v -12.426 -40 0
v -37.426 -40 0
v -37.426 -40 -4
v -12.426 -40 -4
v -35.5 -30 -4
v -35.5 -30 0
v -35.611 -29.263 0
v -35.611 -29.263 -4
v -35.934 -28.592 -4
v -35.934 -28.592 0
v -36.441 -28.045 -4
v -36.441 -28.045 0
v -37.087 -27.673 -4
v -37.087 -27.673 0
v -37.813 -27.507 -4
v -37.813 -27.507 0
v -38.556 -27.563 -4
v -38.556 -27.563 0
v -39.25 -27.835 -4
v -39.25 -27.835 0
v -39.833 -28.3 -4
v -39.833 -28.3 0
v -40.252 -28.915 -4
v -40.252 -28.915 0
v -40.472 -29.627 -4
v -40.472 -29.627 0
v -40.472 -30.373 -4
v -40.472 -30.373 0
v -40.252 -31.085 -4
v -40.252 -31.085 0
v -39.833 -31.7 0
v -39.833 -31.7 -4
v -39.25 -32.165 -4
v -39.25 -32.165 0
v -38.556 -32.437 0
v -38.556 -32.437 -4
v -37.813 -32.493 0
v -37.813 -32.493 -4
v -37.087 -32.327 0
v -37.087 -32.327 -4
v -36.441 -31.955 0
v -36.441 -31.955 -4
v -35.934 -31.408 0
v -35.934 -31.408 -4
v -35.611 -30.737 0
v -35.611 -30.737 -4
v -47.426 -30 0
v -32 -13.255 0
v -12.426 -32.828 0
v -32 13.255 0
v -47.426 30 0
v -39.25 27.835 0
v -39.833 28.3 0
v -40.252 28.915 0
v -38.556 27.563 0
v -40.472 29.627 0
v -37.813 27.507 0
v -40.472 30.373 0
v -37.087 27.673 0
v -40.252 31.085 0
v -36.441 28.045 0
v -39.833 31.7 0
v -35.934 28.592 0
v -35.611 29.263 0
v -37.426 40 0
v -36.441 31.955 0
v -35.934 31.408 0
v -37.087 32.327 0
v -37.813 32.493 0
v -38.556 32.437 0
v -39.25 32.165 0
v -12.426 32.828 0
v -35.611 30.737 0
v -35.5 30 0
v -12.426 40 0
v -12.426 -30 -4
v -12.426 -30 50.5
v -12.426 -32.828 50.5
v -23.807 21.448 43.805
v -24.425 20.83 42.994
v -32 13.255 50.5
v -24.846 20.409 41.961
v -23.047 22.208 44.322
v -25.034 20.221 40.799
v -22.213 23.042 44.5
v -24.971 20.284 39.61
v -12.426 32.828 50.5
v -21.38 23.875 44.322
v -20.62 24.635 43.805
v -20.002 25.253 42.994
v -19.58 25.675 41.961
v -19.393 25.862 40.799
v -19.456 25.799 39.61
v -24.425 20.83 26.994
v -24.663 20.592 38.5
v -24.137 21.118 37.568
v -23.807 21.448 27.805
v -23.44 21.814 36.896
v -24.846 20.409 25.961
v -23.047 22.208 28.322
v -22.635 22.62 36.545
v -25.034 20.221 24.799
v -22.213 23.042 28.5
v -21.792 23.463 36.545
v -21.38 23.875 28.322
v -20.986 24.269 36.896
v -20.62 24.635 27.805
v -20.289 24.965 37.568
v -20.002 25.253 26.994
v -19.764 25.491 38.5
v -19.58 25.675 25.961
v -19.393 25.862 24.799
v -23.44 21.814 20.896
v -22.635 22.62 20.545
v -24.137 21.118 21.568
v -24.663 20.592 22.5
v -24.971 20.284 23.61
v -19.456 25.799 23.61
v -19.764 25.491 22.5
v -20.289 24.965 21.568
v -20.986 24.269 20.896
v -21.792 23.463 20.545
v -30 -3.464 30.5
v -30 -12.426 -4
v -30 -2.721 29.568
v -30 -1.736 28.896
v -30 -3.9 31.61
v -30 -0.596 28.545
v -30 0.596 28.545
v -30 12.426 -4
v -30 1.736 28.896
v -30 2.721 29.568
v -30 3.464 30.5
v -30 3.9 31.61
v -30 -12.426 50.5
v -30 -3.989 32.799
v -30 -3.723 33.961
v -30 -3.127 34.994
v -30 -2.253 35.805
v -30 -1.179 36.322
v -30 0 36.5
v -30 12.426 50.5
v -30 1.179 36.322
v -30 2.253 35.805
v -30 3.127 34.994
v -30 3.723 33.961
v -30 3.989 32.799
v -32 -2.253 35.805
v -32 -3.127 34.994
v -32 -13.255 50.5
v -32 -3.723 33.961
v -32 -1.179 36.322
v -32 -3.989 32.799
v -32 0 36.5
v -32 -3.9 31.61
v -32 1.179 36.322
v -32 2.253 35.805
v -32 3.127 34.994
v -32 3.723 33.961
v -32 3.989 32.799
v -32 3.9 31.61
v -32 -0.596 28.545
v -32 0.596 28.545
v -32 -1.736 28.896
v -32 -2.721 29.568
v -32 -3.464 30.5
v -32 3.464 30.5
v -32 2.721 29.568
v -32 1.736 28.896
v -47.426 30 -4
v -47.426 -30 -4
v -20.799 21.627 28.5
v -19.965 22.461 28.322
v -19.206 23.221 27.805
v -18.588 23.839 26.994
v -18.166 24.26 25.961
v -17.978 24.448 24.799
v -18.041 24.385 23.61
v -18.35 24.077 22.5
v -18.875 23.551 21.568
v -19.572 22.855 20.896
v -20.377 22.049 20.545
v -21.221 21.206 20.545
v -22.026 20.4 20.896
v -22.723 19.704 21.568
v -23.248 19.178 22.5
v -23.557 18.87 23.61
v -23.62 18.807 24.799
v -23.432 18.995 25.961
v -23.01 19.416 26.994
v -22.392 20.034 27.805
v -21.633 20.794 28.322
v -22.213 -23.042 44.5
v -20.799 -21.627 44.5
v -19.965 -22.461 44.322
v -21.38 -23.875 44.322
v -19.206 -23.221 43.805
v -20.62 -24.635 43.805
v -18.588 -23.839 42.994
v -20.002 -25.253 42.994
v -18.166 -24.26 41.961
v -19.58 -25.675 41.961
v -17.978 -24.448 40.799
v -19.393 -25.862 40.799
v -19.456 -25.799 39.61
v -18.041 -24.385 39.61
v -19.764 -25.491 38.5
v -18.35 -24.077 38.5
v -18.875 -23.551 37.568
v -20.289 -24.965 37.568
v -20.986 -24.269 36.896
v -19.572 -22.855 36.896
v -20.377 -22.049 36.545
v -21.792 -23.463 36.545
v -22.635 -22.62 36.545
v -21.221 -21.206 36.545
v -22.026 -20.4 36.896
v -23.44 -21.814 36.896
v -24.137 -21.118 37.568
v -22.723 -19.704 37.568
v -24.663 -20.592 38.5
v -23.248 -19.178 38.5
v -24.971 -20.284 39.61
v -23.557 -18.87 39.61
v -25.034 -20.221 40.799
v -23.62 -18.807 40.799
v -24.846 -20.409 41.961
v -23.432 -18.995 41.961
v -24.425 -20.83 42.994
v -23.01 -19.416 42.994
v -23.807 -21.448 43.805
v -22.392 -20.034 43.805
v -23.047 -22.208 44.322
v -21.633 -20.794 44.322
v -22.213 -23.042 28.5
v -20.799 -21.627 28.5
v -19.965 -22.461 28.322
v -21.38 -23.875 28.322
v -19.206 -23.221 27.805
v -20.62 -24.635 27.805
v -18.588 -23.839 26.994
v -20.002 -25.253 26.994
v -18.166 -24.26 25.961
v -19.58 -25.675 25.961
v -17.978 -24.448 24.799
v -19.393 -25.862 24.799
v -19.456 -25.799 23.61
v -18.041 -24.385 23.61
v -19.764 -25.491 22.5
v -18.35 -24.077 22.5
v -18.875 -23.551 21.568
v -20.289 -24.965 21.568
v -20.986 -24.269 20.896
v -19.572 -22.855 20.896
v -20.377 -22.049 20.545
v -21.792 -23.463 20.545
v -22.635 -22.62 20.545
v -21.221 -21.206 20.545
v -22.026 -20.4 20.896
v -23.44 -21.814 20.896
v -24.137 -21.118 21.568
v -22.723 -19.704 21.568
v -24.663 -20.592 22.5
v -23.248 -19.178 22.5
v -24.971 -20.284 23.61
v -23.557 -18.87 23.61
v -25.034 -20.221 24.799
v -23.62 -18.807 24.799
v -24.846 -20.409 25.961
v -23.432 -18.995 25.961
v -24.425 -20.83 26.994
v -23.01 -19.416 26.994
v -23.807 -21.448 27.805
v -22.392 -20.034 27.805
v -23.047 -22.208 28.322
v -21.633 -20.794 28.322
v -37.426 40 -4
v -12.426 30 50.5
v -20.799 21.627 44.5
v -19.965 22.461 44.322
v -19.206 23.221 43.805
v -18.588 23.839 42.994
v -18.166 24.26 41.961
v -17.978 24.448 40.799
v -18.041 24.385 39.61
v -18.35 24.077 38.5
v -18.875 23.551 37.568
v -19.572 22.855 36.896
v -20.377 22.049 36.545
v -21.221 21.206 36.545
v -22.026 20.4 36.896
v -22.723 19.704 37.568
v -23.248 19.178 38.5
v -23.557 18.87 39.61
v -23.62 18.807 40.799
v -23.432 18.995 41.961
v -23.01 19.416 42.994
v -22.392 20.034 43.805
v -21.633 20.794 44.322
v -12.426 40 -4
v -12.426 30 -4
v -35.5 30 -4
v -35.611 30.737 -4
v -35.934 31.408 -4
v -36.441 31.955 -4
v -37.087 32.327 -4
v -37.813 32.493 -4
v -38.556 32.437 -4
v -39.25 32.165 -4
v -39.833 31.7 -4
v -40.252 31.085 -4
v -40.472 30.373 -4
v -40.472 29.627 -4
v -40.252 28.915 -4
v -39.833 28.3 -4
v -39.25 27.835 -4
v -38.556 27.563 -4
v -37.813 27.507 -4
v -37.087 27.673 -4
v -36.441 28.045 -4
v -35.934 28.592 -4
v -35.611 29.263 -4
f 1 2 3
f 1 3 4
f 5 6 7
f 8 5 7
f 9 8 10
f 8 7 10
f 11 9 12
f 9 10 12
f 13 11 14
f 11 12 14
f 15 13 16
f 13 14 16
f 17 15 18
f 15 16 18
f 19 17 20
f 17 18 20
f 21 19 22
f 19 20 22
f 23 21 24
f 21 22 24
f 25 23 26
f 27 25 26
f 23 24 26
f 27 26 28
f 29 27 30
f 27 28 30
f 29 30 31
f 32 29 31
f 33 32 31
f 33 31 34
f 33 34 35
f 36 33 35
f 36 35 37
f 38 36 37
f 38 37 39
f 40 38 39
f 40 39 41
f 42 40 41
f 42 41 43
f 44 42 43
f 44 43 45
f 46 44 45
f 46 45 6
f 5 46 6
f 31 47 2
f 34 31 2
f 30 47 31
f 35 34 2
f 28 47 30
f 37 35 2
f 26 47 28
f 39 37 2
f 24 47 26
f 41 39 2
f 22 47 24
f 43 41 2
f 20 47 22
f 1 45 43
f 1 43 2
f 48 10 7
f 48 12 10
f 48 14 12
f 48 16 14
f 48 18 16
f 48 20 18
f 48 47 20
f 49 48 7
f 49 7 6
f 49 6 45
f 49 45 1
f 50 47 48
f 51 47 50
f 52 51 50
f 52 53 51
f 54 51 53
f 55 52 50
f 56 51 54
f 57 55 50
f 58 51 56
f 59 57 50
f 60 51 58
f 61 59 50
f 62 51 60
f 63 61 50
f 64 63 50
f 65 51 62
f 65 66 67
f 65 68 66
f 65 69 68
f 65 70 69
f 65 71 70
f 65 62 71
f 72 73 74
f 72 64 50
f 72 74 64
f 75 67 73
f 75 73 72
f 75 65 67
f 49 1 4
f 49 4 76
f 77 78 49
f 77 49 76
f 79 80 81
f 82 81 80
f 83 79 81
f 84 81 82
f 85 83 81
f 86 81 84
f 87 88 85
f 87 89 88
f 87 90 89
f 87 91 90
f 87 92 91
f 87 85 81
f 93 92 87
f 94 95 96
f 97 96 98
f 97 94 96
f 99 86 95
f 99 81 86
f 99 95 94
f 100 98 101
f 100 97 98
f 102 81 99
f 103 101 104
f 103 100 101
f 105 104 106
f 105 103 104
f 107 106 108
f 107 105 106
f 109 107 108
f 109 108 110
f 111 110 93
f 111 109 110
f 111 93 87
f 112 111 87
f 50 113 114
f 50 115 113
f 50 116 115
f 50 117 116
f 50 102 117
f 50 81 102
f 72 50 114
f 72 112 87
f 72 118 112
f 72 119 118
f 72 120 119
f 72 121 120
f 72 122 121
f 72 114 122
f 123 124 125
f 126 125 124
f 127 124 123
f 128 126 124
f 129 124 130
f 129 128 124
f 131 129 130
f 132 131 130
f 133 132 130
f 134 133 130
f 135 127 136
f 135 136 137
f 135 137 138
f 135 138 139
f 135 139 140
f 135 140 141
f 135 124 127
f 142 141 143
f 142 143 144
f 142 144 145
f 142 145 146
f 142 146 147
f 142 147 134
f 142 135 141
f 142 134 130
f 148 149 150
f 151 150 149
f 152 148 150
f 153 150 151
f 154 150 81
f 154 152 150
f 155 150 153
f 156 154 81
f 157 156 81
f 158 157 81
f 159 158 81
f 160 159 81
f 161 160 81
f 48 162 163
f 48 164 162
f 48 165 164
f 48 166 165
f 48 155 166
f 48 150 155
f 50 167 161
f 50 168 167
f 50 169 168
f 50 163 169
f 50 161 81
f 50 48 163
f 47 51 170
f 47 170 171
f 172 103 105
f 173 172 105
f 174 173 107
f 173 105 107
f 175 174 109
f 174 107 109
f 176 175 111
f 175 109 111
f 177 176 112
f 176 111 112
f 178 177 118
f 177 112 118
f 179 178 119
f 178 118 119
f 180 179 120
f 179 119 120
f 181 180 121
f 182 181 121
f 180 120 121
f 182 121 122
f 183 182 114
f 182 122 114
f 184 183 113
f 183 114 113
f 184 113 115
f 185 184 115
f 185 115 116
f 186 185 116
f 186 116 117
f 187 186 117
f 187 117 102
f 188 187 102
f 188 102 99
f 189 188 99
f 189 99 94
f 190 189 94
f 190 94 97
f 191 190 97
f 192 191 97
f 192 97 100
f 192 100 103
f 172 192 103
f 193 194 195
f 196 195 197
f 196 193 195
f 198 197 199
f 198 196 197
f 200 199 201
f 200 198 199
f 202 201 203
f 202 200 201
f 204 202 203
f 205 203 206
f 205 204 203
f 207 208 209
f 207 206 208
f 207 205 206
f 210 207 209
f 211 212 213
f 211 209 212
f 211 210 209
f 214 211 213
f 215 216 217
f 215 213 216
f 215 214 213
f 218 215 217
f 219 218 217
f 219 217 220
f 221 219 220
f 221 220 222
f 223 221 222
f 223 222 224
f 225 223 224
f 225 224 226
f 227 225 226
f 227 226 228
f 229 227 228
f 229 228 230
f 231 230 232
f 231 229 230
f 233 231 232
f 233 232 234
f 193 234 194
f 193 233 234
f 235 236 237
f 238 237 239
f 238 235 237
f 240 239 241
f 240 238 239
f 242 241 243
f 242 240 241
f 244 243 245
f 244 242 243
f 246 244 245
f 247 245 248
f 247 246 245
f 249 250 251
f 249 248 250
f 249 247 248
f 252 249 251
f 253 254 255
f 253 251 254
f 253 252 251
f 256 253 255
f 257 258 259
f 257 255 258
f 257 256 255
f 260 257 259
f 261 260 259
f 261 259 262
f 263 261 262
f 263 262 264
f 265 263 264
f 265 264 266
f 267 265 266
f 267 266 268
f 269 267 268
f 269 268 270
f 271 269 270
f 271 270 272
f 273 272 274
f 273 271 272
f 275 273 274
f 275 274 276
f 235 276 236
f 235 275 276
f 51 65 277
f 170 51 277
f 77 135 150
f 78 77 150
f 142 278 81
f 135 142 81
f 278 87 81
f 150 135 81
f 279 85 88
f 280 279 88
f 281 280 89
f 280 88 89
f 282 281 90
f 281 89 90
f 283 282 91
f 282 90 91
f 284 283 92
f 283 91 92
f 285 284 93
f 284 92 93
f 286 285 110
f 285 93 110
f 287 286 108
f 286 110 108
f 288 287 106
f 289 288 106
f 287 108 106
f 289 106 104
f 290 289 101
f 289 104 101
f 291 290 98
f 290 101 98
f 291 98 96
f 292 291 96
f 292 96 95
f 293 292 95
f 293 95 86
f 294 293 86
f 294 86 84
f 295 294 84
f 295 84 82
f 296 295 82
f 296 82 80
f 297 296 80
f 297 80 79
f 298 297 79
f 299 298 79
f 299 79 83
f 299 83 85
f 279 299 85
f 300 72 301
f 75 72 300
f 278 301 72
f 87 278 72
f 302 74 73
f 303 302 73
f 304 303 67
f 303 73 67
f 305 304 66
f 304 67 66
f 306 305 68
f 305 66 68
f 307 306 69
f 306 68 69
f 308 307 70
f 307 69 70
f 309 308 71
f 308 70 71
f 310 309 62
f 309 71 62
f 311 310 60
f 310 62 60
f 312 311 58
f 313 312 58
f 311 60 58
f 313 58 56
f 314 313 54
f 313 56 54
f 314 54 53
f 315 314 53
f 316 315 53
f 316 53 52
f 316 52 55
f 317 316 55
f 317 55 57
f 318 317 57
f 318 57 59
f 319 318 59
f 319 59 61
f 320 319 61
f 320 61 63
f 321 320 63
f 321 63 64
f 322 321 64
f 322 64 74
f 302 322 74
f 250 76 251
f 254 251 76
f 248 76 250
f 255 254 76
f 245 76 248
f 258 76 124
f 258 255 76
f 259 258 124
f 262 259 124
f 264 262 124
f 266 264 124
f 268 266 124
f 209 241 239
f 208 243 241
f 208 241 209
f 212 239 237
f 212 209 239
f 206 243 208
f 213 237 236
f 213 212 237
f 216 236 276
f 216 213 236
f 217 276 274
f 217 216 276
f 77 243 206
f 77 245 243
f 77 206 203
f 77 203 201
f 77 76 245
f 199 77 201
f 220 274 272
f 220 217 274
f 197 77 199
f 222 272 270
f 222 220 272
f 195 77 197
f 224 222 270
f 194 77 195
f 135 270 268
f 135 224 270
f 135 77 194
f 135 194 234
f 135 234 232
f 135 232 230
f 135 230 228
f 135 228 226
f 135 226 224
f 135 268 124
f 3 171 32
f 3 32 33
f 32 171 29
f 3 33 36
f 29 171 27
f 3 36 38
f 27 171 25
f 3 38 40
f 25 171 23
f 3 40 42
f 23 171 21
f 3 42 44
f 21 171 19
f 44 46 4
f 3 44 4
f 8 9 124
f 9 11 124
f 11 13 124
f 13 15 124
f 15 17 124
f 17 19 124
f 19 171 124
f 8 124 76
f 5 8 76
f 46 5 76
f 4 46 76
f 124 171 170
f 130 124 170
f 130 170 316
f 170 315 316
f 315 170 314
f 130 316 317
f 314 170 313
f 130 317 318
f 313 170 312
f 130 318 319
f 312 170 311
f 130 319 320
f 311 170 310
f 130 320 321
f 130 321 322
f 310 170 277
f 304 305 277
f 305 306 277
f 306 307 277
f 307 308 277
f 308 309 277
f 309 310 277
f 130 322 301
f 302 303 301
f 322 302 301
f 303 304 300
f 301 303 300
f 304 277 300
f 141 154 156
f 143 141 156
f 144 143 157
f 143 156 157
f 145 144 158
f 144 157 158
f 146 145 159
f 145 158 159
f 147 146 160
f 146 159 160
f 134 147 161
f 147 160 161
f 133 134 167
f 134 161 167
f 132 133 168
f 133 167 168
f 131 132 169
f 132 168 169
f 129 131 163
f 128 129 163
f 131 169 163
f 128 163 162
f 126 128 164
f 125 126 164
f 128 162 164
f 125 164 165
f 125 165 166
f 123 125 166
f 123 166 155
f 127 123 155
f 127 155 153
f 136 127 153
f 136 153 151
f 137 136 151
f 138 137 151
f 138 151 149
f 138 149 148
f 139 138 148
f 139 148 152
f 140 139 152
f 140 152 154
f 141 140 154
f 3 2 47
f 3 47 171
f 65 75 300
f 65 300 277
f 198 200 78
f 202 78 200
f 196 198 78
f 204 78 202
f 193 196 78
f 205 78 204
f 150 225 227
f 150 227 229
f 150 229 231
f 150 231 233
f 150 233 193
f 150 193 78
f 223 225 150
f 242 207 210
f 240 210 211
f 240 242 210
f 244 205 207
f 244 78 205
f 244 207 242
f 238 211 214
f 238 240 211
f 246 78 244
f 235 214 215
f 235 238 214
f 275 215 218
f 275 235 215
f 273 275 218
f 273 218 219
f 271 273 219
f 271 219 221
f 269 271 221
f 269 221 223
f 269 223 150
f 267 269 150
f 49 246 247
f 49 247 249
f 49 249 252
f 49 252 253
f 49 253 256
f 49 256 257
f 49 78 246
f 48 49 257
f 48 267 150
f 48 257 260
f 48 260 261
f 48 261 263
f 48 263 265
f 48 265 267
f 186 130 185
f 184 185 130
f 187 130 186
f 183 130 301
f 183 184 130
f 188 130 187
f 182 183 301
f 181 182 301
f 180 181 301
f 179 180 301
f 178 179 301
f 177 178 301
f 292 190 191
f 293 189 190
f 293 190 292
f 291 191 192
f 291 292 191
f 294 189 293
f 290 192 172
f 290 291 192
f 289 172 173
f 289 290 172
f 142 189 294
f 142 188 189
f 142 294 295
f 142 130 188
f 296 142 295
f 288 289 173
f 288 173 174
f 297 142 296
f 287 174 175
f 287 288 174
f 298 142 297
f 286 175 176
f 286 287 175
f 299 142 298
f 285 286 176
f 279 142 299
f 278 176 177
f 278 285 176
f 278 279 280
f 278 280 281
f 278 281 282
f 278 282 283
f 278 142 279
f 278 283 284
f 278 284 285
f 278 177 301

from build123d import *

# Parameters (mm, degrees)
EXTRUDE_1_DEPTH     = 50.5
EXTRUDE_2_DEPTH     = 4
CHAMFER_1_SIZE      = 10
SKETCH_3_R          = 4
CUT_EXTRUDE_1_DEPTH = 10
SKETCH_4_R          = 4
CUT_EXTRUDE_2_DEPTH = 10
SKETCH_5_R          = 2.5
CUT_EXTRUDE_3_DEPTH = 10


with BuildPart() as part:
    # 草图1 → 凸台-拉伸1 (new body)
    with BuildSketch(Plane.XY):
        Polygon((-12.426406871, 30), (-30, 12.426406871), (-30, -12.426406871), (-12.426406871, -30), (-12.426406871, -32.828427125), (-32, -13.254833996), (-32, 13.254833996), (-12.426406871, 32.828427125), align=None)
    extrude(amount=EXTRUDE_1_DEPTH)

    # 草图2 → 凸台-拉伸2 (add)
    with BuildSketch(Plane(origin=(0, 0, 0), x_dir=(-1, 0, 0), z_dir=(0, 0, -1))):
        Polygon((12.426406871, 30), (12.426406871, 40), (47.426406871, 40), (47.426406871, -40), (12.426406871, -40), (12.426406871, -30), (30, -12.426406871), (30, 12.426406871), align=None)
    extrude(amount=EXTRUDE_2_DEPTH)

    # 倒角1
    chamfer_1_edges = [part.edges().sort_by_distance(p)[0] for p in [
        (-47.426406871, -40, -2),
        (-47.426406871, 40, -2),
    ]]
    chamfer(chamfer_1_edges, length=CHAMFER_1_SIZE)

    # 草图3 → 切除-拉伸1 (cut)
    with BuildSketch(Plane(origin=(-22.627416998, 22.627416998, 0), x_dir=(0, 0, 1), z_dir=(-0.707106781, 0.707106781, 0))):
        with Locations((40.5, 0.585786438)):
            Circle(SKETCH_3_R)
        with Locations((24.5, 0.585786438)):
            Circle(SKETCH_3_R)
    cut_extrude_1 = extrude(amount=-CUT_EXTRUDE_1_DEPTH, mode=Mode.SUBTRACT)

    # 草图4 → 切除-拉伸2 (cut)
    with BuildSketch(Plane.ZY.offset(32)):
        with Locations((32.5, 0)):
            Circle(SKETCH_4_R)
    extrude(amount=-CUT_EXTRUDE_2_DEPTH, mode=Mode.SUBTRACT)

    # 镜向1: 切除-拉伸1 across plane
    add(cut_extrude_1.mirror(Plane.ZX), mode=Mode.SUBTRACT)

    # 草图5 → 切除-拉伸3 (cut)
    with BuildSketch(Plane.XY):
        with Locations((-38, 30)):
            Circle(SKETCH_5_R)
        with Locations((-38, -30)):
            Circle(SKETCH_5_R)
    extrude(amount=-CUT_EXTRUDE_3_DEPTH, mode=Mode.SUBTRACT)


solid = part.part
